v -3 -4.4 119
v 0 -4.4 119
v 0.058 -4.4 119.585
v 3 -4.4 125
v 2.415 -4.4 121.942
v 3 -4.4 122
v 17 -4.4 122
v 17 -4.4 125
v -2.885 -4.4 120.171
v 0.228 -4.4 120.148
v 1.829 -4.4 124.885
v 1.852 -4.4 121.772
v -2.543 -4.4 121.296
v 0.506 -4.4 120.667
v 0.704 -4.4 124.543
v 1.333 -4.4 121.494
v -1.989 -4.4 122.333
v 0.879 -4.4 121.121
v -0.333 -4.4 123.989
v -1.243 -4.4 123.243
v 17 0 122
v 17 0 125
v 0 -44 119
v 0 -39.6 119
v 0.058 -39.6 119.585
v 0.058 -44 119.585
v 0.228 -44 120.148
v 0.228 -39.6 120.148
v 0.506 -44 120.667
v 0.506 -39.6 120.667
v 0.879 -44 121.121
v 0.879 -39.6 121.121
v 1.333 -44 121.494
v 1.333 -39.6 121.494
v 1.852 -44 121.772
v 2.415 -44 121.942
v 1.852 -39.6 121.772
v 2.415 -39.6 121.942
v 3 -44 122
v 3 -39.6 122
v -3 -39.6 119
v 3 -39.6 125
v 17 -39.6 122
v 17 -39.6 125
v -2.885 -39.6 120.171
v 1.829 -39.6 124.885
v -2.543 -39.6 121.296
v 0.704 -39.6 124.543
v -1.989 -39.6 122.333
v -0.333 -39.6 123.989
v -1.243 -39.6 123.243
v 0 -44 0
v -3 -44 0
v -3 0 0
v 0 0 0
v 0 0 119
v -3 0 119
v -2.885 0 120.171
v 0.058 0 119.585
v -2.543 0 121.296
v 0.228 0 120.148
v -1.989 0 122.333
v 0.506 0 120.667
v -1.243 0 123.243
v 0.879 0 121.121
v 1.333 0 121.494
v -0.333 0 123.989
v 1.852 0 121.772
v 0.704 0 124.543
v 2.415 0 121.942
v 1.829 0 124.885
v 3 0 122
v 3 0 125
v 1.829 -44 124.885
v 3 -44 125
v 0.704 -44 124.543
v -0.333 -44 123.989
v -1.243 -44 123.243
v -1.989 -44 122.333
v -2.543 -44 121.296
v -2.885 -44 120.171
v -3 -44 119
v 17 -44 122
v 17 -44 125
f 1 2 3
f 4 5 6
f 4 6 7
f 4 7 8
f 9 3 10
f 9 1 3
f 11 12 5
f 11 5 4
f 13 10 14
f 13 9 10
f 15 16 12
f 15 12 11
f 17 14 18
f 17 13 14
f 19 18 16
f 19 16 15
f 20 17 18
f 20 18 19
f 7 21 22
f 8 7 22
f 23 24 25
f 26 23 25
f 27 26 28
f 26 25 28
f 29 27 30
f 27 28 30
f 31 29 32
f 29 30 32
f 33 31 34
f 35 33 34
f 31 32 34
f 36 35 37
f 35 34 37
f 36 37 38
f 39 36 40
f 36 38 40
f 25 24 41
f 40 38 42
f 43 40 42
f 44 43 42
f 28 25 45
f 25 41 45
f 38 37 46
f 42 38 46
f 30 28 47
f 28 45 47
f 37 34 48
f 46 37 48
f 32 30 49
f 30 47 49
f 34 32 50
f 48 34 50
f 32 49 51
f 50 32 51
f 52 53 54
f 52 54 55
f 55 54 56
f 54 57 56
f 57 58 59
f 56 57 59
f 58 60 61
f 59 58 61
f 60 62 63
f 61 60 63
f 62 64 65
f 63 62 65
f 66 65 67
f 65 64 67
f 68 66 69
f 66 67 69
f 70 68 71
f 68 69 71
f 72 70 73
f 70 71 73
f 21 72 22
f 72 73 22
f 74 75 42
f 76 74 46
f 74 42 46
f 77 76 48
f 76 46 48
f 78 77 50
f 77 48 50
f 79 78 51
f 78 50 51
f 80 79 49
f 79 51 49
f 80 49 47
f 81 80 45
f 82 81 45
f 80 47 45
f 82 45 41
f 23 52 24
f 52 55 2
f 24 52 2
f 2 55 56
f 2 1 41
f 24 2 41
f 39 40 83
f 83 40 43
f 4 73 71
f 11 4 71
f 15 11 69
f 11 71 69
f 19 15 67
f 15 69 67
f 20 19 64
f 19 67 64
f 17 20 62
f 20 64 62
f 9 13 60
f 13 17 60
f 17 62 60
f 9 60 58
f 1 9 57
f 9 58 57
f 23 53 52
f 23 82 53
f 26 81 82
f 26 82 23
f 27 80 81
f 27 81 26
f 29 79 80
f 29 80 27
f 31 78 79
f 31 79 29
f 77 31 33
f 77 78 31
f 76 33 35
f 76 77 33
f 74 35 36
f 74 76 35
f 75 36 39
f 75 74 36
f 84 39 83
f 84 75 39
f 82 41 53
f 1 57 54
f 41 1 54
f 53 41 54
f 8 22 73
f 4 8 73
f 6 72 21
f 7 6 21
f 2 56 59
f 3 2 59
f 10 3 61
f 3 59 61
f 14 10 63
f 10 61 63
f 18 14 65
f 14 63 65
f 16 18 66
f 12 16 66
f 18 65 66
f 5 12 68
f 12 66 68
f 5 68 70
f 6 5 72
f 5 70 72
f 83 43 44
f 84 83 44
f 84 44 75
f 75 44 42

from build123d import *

# Parameters (mm, degrees)
F1_DEPTH = 44
F2_W     = 35.2
F2_H     = 20
F3_DEPTH = 20.001


with BuildPart() as f1:
    # F0 (on Front) → F1 (new body)
    with BuildSketch(Plane.XZ):
        with BuildLine():
            Line((-3, 0), (0, 0))
            Line((0, 0), (0, 119))
            ThreePointArc((0, 119), (0.8786796564, 121.1213203436), (3, 122))
            Line((3, 122), (17, 122))
            Line((17, 122), (17, 125))
            Line((17, 125), (3, 125))
            ThreePointArc((3, 125), (-1.2426406871, 123.2426406871), (-3, 119))
            Line((-3, 119), (-3, 0))
        make_face()
    extrude(amount=F1_DEPTH)

    # F2 (on face) → F3 (cut, through all)
    with BuildSketch(Plane(origin=(-3, 0, 0), x_dir=(0, -1, 0), z_dir=(-1, 0, 0))):
        with Locations((22, 129)):
            Rectangle(F2_W, F2_H)
    extrude(amount=-F3_DEPTH, mode=Mode.SUBTRACT)


solid = f1.part
